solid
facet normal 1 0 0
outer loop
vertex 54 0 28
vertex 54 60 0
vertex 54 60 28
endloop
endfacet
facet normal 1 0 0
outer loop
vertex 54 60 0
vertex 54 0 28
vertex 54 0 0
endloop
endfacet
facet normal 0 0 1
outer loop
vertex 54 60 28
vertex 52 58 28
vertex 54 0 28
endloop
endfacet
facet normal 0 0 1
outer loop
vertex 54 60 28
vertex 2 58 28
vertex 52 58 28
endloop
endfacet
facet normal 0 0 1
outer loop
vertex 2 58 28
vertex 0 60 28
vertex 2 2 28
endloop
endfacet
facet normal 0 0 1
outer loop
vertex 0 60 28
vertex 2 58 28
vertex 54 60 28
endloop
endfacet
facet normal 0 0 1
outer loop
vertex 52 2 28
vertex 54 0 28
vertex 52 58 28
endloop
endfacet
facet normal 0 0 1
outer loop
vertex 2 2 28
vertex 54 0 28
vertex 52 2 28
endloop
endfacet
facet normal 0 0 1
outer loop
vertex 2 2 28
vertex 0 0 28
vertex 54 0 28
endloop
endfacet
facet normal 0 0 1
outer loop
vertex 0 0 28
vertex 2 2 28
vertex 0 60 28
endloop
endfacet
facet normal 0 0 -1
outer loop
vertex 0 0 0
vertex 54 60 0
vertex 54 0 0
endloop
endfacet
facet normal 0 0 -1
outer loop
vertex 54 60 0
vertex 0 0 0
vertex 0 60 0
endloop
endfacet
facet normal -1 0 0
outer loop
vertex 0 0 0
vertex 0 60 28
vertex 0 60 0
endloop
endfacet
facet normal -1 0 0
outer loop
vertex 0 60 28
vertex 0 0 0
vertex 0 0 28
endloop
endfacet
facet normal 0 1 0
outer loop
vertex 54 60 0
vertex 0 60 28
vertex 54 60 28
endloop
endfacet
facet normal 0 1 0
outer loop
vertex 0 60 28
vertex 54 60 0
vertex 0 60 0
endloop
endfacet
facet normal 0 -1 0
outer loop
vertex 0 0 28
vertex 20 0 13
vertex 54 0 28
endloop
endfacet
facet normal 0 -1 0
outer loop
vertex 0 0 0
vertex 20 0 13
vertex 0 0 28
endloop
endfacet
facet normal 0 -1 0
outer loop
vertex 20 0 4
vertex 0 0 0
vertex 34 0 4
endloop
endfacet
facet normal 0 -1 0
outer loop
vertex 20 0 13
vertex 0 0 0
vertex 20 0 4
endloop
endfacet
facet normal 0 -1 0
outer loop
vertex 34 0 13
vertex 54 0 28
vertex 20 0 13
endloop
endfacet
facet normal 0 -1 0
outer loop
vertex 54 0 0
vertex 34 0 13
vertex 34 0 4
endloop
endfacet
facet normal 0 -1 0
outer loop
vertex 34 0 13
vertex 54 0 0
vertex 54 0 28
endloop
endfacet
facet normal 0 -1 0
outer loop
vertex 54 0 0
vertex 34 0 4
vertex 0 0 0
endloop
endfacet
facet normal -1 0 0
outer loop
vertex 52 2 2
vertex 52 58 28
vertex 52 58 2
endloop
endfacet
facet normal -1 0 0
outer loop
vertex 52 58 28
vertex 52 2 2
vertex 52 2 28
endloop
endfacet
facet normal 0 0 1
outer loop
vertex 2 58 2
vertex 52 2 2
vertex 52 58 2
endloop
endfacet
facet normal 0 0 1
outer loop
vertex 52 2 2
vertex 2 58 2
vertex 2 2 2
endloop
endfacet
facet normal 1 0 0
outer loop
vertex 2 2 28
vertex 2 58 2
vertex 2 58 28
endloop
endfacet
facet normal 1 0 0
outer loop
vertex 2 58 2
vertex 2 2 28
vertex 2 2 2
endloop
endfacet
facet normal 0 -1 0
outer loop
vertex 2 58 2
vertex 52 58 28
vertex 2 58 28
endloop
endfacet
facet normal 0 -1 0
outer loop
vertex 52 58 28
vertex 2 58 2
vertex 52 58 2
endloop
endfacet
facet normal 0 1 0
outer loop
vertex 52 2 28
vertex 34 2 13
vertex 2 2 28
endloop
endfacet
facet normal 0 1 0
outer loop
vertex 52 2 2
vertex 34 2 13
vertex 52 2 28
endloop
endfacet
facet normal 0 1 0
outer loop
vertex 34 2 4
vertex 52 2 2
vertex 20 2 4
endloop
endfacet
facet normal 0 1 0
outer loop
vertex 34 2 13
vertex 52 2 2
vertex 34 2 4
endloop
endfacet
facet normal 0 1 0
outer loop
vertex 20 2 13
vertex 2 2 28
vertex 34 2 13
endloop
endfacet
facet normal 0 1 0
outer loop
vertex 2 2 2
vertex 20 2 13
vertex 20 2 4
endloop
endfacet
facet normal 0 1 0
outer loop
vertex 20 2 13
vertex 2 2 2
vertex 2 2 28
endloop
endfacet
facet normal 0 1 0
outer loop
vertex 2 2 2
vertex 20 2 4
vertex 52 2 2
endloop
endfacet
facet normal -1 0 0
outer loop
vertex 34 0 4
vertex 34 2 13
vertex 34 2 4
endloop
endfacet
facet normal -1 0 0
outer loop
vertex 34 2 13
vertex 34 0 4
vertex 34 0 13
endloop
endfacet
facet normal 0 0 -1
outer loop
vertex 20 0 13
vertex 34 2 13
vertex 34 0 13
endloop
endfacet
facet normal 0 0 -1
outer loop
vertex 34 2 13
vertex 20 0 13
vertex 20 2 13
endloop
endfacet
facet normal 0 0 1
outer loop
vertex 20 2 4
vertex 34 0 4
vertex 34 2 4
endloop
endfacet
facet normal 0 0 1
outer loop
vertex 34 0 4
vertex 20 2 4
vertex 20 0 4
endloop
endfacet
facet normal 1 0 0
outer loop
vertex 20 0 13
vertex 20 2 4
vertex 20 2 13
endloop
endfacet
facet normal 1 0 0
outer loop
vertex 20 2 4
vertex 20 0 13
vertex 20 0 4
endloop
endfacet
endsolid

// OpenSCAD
// Teaching example: measure your actual modules before printing.
// Units: mm. This is a new parametric enclosure, not Tobi's original CAD.
part = "base"; // base, lid, coupon
outer_w = 54;
outer_h = 60;
depth = 28;
wall = 2;
clearance = 0.3; // per side
window_w = 25;
window_h = 14;
usb_w = 14;
usb_h = 9;
$fn = 32;
assert(outer_w > window_w+4*wall && outer_h > window_h+4*wall);
assert(depth > usb_h+2*wall && clearance >= 0);
module base() {
 difference() {
  cube([outer_w,outer_h,depth]);
  translate([wall,wall,wall]) cube([outer_w-2*wall,outer_h-2*wall,depth]);
  translate([(outer_w-usb_w)/2,-1,wall+2]) cube([usb_w,wall+2,usb_h]);
 }
}
module lid() {
 difference() {
  union() {
   cube([outer_w,outer_h,wall]);
   translate([wall+clearance,wall+clearance,wall-0.1])
    difference() {
     cube([outer_w-2*(wall+clearance),outer_h-2*(wall+clearance),3.1]);
     translate([wall,wall,-1]) cube([outer_w-2*(2*wall+clearance),outer_h-2*(2*wall+clearance),6]);
    }
  }
  translate([(outer_w-window_w)/2,(outer_h-window_h)/2,-1]) cube([window_w,window_h,wall+2]);
 }
}
module coupon() {
 difference() {
  cube([window_w+12,window_h+12,wall]);
  translate([6,6,-1]) cube([window_w,window_h,wall+2]);
 }
}
if(part=="base") base();
else if(part=="lid") lid();
else if(part=="coupon") coupon();
else assert(false,"Choose base, lid or coupon");
